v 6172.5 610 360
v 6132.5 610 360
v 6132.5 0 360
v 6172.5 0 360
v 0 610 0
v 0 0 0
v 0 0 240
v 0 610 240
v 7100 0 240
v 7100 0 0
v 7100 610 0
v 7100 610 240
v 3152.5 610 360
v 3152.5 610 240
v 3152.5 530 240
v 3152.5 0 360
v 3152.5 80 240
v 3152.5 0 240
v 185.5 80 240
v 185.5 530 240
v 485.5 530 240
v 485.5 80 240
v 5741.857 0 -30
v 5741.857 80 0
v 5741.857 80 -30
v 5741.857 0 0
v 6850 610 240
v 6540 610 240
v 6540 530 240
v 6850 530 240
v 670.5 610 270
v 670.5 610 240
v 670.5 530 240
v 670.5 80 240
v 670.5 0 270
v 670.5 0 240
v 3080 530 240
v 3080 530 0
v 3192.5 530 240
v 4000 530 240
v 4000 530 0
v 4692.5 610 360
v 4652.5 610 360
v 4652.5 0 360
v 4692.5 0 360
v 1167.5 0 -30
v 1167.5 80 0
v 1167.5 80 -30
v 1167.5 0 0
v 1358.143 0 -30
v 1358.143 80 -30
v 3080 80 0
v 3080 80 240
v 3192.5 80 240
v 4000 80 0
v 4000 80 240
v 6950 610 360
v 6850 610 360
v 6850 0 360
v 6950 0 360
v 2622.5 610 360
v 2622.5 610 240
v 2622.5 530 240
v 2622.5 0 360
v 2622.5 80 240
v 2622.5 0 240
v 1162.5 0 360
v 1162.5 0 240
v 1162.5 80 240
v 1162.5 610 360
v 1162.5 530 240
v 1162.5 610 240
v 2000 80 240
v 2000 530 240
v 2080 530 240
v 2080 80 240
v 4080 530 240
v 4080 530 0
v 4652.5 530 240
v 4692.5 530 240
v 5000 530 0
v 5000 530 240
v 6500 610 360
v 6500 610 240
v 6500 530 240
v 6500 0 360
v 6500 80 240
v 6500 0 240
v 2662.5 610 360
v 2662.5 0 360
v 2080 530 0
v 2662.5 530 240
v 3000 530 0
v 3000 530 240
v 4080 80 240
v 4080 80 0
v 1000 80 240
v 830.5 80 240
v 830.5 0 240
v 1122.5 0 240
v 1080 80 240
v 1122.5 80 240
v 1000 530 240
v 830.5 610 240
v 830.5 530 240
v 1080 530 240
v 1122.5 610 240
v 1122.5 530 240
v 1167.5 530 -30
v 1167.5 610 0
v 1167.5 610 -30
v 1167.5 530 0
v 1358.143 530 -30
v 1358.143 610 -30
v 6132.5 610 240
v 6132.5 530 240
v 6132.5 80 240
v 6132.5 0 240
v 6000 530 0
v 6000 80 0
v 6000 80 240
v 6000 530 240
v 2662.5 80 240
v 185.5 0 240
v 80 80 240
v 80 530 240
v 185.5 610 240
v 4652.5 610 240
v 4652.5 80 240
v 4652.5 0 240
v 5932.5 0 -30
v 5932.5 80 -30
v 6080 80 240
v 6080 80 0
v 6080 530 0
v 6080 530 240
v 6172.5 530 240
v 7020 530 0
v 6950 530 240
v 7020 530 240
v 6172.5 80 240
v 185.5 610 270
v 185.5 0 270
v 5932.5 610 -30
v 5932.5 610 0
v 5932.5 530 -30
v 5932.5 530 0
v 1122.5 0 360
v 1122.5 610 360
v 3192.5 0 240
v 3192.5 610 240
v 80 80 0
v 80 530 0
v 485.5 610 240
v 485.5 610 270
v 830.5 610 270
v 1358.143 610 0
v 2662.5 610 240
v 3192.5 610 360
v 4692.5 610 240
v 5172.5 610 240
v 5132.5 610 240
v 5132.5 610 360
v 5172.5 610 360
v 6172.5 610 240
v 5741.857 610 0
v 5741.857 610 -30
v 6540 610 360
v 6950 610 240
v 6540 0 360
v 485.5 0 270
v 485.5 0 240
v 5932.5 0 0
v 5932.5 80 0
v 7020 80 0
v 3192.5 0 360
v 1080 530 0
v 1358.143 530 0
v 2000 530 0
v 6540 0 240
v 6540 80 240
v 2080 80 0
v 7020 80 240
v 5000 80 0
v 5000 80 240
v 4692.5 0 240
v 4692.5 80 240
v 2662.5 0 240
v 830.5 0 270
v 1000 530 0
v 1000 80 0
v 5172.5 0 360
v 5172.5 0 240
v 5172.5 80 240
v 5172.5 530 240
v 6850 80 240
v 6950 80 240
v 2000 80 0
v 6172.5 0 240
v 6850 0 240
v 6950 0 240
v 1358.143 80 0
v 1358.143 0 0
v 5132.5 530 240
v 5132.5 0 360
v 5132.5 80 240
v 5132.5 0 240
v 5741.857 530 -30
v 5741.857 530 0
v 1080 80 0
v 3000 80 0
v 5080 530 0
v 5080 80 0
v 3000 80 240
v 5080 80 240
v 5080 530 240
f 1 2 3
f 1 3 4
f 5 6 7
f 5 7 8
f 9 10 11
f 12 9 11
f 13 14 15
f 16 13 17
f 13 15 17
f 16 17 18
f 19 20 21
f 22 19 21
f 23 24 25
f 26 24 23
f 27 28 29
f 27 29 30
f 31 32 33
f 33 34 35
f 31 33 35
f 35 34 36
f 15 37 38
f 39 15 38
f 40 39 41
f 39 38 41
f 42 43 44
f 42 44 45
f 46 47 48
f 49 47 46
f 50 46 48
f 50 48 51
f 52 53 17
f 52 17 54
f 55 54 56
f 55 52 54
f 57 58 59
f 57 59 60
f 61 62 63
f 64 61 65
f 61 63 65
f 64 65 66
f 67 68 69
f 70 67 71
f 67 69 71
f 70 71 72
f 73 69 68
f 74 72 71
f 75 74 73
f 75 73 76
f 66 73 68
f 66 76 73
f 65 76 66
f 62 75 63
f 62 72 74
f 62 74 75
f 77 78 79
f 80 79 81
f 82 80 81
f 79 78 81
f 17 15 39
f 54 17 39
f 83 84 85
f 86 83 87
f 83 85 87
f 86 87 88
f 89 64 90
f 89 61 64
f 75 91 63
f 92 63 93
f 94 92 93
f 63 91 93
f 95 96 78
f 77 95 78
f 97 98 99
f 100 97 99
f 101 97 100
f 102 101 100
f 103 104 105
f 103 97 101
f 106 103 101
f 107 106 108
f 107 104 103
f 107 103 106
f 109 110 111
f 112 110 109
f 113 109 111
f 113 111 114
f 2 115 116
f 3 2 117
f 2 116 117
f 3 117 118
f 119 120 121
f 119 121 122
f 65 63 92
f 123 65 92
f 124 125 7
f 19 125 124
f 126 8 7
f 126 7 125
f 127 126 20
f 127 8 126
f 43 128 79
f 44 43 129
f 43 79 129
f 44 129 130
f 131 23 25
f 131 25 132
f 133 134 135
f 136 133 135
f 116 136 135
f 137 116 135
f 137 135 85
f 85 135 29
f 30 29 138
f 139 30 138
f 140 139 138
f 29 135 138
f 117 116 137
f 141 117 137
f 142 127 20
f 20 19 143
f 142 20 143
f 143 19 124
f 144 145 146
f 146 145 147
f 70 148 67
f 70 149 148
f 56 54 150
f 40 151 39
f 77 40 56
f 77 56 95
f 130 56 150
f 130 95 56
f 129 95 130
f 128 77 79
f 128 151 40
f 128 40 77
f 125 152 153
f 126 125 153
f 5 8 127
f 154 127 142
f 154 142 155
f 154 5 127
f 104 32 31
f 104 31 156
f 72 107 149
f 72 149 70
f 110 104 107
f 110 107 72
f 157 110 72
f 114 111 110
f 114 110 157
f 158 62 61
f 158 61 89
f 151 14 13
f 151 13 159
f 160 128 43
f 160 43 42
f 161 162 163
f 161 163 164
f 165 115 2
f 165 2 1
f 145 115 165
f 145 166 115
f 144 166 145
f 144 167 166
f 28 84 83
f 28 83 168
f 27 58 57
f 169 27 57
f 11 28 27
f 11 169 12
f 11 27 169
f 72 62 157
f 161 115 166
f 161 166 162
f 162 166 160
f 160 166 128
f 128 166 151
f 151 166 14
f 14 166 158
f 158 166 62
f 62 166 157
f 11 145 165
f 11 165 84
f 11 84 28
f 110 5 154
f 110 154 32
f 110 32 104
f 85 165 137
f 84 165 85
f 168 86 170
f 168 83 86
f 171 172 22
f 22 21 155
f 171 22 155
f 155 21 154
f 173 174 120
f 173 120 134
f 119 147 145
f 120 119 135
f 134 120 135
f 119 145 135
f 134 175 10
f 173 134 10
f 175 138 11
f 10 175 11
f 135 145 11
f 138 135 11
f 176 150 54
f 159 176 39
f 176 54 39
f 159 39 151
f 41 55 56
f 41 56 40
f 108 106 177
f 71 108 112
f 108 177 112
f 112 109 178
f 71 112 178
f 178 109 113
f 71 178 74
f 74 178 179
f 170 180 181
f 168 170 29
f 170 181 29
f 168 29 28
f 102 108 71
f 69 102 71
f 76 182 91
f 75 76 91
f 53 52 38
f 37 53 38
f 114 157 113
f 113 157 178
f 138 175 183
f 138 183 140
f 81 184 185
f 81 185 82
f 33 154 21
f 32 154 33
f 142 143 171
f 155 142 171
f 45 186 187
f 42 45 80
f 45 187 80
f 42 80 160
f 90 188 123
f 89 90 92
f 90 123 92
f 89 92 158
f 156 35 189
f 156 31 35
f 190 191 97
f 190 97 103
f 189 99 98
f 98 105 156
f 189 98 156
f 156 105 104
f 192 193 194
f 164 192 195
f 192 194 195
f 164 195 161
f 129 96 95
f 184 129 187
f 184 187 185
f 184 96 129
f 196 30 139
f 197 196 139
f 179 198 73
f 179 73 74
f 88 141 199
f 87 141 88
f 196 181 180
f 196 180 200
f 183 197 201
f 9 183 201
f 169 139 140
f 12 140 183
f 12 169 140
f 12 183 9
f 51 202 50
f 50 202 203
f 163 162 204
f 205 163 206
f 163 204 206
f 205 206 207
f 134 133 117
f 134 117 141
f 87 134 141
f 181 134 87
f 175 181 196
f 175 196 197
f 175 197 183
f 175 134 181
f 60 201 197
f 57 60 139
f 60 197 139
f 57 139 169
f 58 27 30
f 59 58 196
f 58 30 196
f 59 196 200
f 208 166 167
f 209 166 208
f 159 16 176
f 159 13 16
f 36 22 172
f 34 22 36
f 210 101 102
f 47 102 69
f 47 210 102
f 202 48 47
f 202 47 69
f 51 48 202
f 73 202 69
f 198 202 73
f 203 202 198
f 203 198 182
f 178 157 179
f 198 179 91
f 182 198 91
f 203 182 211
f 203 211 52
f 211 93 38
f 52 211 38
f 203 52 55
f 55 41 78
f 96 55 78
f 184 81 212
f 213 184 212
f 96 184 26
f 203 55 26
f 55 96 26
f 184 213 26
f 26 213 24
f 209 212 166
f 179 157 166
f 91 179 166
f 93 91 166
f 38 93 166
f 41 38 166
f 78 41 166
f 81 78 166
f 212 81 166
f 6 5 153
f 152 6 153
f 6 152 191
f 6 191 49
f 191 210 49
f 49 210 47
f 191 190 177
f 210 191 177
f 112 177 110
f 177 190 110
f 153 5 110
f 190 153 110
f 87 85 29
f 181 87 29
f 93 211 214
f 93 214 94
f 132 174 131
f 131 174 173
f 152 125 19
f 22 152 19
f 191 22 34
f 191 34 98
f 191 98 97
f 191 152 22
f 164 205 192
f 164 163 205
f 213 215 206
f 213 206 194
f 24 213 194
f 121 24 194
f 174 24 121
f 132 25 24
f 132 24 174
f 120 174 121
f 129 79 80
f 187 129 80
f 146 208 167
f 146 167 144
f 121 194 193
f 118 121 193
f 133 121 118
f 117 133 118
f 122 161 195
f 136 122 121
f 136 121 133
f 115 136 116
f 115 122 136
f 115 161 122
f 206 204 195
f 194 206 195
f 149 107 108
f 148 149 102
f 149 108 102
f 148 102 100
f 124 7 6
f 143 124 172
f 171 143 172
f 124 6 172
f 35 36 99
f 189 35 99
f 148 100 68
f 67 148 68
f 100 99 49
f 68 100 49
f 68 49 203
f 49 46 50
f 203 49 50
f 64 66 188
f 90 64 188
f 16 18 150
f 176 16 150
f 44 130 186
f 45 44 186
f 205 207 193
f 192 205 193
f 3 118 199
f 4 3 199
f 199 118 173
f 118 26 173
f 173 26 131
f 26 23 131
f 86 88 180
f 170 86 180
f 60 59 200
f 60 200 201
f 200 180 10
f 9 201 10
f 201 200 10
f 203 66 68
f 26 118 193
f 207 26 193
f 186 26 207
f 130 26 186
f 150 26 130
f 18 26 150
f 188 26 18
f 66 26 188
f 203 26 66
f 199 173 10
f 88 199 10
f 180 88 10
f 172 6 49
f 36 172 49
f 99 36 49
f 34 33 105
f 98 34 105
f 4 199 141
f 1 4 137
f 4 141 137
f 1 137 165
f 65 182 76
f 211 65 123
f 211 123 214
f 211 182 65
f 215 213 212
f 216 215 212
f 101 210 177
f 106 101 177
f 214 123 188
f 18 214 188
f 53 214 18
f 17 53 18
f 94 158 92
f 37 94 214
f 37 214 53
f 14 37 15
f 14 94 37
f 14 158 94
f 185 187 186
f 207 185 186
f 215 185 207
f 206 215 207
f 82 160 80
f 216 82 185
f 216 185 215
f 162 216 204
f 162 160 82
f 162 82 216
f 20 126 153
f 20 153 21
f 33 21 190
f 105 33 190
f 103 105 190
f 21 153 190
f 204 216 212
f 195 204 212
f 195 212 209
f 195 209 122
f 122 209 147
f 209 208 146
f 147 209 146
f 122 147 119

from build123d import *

# Parameters (mm, degrees)
F0_W     = 7100
F0_H     = 610
F0_W_2   = 920
F0_H_2   = 450
F0_W_3   = 940
F1_DEPTH = 240
F2_W     = 190.6431913376
F2_H     = 80
F3_DEPTH = 30
F4_W     = 100
F4_H     = 80
F4_H_2   = 450
F4_W_2   = 40
F5_DEPTH = 120
F4_W_3   = 300
F4_W_4   = 160
F6_DEPTH = 30


with BuildPart() as f1:
    # F0 (on Top) → F1 (new body)
    with BuildSketch(Plane.XY):
        with Locations((3550, 305)):
            Rectangle(F0_W, F0_H)
        with Locations((540, 305)):
            Rectangle(F0_W_2, F0_H_2, mode=Mode.SUBTRACT)
        with Locations((1540, 305)):
            Rectangle(F0_W_2, F0_H_2, mode=Mode.SUBTRACT)
        with Locations((2540, 305)):
            Rectangle(F0_W_2, F0_H_2, mode=Mode.SUBTRACT)
        with Locations((3540, 305)):
            Rectangle(F0_W_2, F0_H_2, mode=Mode.SUBTRACT)
        with Locations((4540, 305)):
            Rectangle(F0_W_2, F0_H_2, mode=Mode.SUBTRACT)
        with Locations((5540, 305)):
            Rectangle(F0_W_2, F0_H_2, mode=Mode.SUBTRACT)
        with Locations((6550, 305)):
            Rectangle(F0_W_3, F0_H_2, mode=Mode.SUBTRACT)
    extrude(amount=F1_DEPTH)

    # F2 (on face) → F3 (join)
    with BuildSketch(Plane(origin=(0, 0, 0), x_dir=(1, 0, 0), z_dir=(0, 0, -1))):
        with Locations((1262.8215956688, -40)):
            Rectangle(F2_W, F2_H)
        with Locations((1262.8215956688, -570)):
            Rectangle(F2_W, F2_H)
        with Locations((5837.1784043312, -570)):
            Rectangle(F2_W, F2_H)
        with Locations((5837.1784043312, -40)):
            Rectangle(F2_W, F2_H)
    extrude(amount=F3_DEPTH)

    # F4 (on face) → F5 (join)
    with BuildSketch(Plane.XY.offset(240)):
        with Locations((6900, 570)):
            Rectangle(F4_W, F4_H)
        with Locations((6900, 305)):
            Rectangle(F4_W, F4_H_2)
        with Locations((6900, 40)):
            Rectangle(F4_W, F4_H)
        with Locations((6520, 40)):
            Rectangle(F4_W_2, F4_H)
        with Locations((6520, 305)):
            Rectangle(F4_W_2, F4_H_2)
        with Locations((6520, 570)):
            Rectangle(F4_W_2, F4_H)
        with Locations((6152.5, 570)):
            Rectangle(F4_W_2, F4_H)
        with Locations((6152.5, 305)):
            Rectangle(F4_W_2, F4_H_2)
        with Locations((6152.5, 40)):
            Rectangle(F4_W_2, F4_H)
        with Locations((5152.5, 40)):
            Rectangle(F4_W_2, F4_H)
        with Locations((5152.5, 305)):
            Rectangle(F4_W_2, F4_H_2)
        with Locations((5152.5, 570)):
            Rectangle(F4_W_2, F4_H)
        with Locations((4672.5, 570)):
            Rectangle(F4_W_2, F4_H)
        with Locations((4672.5, 305)):
            Rectangle(F4_W_2, F4_H_2)
        with Locations((4672.5, 40)):
            Rectangle(F4_W_2, F4_H)
        with Locations((3172.5, 40)):
            Rectangle(F4_W_2, F4_H)
        with Locations((3172.5, 305)):
            Rectangle(F4_W_2, F4_H_2)
        with Locations((3172.5, 570)):
            Rectangle(F4_W_2, F4_H)
        with Locations((2642.5, 40)):
            Rectangle(F4_W_2, F4_H)
        with Locations((2642.5, 305)):
            Rectangle(F4_W_2, F4_H_2)
        with Locations((2642.5, 570)):
            Rectangle(F4_W_2, F4_H)
        with Locations((1142.5, 40)):
            Rectangle(F4_W_2, F4_H)
        with Locations((1142.5, 305)):
            Rectangle(F4_W_2, F4_H_2)
        with Locations((1142.5, 570)):
            Rectangle(F4_W_2, F4_H)
    extrude(amount=F5_DEPTH)

    # F4 (on face) → F6 (join)
    with BuildSketch(Plane.XY.offset(240)):
        with Locations((335.5, 570)):
            Rectangle(F4_W_3, F4_H)
        with Locations((335.5, 305)):
            Rectangle(F4_W_3, F4_H_2)
        with Locations((335.5, 40)):
            Rectangle(F4_W_3, F4_H)
        with Locations((750.5, 40)):
            Rectangle(F4_W_4, F4_H)
        with Locations((750.5, 305)):
            Rectangle(F4_W_4, F4_H_2)
        with Locations((750.5, 570)):
            Rectangle(F4_W_4, F4_H)
    extrude(amount=F6_DEPTH)


solid = f1.part
